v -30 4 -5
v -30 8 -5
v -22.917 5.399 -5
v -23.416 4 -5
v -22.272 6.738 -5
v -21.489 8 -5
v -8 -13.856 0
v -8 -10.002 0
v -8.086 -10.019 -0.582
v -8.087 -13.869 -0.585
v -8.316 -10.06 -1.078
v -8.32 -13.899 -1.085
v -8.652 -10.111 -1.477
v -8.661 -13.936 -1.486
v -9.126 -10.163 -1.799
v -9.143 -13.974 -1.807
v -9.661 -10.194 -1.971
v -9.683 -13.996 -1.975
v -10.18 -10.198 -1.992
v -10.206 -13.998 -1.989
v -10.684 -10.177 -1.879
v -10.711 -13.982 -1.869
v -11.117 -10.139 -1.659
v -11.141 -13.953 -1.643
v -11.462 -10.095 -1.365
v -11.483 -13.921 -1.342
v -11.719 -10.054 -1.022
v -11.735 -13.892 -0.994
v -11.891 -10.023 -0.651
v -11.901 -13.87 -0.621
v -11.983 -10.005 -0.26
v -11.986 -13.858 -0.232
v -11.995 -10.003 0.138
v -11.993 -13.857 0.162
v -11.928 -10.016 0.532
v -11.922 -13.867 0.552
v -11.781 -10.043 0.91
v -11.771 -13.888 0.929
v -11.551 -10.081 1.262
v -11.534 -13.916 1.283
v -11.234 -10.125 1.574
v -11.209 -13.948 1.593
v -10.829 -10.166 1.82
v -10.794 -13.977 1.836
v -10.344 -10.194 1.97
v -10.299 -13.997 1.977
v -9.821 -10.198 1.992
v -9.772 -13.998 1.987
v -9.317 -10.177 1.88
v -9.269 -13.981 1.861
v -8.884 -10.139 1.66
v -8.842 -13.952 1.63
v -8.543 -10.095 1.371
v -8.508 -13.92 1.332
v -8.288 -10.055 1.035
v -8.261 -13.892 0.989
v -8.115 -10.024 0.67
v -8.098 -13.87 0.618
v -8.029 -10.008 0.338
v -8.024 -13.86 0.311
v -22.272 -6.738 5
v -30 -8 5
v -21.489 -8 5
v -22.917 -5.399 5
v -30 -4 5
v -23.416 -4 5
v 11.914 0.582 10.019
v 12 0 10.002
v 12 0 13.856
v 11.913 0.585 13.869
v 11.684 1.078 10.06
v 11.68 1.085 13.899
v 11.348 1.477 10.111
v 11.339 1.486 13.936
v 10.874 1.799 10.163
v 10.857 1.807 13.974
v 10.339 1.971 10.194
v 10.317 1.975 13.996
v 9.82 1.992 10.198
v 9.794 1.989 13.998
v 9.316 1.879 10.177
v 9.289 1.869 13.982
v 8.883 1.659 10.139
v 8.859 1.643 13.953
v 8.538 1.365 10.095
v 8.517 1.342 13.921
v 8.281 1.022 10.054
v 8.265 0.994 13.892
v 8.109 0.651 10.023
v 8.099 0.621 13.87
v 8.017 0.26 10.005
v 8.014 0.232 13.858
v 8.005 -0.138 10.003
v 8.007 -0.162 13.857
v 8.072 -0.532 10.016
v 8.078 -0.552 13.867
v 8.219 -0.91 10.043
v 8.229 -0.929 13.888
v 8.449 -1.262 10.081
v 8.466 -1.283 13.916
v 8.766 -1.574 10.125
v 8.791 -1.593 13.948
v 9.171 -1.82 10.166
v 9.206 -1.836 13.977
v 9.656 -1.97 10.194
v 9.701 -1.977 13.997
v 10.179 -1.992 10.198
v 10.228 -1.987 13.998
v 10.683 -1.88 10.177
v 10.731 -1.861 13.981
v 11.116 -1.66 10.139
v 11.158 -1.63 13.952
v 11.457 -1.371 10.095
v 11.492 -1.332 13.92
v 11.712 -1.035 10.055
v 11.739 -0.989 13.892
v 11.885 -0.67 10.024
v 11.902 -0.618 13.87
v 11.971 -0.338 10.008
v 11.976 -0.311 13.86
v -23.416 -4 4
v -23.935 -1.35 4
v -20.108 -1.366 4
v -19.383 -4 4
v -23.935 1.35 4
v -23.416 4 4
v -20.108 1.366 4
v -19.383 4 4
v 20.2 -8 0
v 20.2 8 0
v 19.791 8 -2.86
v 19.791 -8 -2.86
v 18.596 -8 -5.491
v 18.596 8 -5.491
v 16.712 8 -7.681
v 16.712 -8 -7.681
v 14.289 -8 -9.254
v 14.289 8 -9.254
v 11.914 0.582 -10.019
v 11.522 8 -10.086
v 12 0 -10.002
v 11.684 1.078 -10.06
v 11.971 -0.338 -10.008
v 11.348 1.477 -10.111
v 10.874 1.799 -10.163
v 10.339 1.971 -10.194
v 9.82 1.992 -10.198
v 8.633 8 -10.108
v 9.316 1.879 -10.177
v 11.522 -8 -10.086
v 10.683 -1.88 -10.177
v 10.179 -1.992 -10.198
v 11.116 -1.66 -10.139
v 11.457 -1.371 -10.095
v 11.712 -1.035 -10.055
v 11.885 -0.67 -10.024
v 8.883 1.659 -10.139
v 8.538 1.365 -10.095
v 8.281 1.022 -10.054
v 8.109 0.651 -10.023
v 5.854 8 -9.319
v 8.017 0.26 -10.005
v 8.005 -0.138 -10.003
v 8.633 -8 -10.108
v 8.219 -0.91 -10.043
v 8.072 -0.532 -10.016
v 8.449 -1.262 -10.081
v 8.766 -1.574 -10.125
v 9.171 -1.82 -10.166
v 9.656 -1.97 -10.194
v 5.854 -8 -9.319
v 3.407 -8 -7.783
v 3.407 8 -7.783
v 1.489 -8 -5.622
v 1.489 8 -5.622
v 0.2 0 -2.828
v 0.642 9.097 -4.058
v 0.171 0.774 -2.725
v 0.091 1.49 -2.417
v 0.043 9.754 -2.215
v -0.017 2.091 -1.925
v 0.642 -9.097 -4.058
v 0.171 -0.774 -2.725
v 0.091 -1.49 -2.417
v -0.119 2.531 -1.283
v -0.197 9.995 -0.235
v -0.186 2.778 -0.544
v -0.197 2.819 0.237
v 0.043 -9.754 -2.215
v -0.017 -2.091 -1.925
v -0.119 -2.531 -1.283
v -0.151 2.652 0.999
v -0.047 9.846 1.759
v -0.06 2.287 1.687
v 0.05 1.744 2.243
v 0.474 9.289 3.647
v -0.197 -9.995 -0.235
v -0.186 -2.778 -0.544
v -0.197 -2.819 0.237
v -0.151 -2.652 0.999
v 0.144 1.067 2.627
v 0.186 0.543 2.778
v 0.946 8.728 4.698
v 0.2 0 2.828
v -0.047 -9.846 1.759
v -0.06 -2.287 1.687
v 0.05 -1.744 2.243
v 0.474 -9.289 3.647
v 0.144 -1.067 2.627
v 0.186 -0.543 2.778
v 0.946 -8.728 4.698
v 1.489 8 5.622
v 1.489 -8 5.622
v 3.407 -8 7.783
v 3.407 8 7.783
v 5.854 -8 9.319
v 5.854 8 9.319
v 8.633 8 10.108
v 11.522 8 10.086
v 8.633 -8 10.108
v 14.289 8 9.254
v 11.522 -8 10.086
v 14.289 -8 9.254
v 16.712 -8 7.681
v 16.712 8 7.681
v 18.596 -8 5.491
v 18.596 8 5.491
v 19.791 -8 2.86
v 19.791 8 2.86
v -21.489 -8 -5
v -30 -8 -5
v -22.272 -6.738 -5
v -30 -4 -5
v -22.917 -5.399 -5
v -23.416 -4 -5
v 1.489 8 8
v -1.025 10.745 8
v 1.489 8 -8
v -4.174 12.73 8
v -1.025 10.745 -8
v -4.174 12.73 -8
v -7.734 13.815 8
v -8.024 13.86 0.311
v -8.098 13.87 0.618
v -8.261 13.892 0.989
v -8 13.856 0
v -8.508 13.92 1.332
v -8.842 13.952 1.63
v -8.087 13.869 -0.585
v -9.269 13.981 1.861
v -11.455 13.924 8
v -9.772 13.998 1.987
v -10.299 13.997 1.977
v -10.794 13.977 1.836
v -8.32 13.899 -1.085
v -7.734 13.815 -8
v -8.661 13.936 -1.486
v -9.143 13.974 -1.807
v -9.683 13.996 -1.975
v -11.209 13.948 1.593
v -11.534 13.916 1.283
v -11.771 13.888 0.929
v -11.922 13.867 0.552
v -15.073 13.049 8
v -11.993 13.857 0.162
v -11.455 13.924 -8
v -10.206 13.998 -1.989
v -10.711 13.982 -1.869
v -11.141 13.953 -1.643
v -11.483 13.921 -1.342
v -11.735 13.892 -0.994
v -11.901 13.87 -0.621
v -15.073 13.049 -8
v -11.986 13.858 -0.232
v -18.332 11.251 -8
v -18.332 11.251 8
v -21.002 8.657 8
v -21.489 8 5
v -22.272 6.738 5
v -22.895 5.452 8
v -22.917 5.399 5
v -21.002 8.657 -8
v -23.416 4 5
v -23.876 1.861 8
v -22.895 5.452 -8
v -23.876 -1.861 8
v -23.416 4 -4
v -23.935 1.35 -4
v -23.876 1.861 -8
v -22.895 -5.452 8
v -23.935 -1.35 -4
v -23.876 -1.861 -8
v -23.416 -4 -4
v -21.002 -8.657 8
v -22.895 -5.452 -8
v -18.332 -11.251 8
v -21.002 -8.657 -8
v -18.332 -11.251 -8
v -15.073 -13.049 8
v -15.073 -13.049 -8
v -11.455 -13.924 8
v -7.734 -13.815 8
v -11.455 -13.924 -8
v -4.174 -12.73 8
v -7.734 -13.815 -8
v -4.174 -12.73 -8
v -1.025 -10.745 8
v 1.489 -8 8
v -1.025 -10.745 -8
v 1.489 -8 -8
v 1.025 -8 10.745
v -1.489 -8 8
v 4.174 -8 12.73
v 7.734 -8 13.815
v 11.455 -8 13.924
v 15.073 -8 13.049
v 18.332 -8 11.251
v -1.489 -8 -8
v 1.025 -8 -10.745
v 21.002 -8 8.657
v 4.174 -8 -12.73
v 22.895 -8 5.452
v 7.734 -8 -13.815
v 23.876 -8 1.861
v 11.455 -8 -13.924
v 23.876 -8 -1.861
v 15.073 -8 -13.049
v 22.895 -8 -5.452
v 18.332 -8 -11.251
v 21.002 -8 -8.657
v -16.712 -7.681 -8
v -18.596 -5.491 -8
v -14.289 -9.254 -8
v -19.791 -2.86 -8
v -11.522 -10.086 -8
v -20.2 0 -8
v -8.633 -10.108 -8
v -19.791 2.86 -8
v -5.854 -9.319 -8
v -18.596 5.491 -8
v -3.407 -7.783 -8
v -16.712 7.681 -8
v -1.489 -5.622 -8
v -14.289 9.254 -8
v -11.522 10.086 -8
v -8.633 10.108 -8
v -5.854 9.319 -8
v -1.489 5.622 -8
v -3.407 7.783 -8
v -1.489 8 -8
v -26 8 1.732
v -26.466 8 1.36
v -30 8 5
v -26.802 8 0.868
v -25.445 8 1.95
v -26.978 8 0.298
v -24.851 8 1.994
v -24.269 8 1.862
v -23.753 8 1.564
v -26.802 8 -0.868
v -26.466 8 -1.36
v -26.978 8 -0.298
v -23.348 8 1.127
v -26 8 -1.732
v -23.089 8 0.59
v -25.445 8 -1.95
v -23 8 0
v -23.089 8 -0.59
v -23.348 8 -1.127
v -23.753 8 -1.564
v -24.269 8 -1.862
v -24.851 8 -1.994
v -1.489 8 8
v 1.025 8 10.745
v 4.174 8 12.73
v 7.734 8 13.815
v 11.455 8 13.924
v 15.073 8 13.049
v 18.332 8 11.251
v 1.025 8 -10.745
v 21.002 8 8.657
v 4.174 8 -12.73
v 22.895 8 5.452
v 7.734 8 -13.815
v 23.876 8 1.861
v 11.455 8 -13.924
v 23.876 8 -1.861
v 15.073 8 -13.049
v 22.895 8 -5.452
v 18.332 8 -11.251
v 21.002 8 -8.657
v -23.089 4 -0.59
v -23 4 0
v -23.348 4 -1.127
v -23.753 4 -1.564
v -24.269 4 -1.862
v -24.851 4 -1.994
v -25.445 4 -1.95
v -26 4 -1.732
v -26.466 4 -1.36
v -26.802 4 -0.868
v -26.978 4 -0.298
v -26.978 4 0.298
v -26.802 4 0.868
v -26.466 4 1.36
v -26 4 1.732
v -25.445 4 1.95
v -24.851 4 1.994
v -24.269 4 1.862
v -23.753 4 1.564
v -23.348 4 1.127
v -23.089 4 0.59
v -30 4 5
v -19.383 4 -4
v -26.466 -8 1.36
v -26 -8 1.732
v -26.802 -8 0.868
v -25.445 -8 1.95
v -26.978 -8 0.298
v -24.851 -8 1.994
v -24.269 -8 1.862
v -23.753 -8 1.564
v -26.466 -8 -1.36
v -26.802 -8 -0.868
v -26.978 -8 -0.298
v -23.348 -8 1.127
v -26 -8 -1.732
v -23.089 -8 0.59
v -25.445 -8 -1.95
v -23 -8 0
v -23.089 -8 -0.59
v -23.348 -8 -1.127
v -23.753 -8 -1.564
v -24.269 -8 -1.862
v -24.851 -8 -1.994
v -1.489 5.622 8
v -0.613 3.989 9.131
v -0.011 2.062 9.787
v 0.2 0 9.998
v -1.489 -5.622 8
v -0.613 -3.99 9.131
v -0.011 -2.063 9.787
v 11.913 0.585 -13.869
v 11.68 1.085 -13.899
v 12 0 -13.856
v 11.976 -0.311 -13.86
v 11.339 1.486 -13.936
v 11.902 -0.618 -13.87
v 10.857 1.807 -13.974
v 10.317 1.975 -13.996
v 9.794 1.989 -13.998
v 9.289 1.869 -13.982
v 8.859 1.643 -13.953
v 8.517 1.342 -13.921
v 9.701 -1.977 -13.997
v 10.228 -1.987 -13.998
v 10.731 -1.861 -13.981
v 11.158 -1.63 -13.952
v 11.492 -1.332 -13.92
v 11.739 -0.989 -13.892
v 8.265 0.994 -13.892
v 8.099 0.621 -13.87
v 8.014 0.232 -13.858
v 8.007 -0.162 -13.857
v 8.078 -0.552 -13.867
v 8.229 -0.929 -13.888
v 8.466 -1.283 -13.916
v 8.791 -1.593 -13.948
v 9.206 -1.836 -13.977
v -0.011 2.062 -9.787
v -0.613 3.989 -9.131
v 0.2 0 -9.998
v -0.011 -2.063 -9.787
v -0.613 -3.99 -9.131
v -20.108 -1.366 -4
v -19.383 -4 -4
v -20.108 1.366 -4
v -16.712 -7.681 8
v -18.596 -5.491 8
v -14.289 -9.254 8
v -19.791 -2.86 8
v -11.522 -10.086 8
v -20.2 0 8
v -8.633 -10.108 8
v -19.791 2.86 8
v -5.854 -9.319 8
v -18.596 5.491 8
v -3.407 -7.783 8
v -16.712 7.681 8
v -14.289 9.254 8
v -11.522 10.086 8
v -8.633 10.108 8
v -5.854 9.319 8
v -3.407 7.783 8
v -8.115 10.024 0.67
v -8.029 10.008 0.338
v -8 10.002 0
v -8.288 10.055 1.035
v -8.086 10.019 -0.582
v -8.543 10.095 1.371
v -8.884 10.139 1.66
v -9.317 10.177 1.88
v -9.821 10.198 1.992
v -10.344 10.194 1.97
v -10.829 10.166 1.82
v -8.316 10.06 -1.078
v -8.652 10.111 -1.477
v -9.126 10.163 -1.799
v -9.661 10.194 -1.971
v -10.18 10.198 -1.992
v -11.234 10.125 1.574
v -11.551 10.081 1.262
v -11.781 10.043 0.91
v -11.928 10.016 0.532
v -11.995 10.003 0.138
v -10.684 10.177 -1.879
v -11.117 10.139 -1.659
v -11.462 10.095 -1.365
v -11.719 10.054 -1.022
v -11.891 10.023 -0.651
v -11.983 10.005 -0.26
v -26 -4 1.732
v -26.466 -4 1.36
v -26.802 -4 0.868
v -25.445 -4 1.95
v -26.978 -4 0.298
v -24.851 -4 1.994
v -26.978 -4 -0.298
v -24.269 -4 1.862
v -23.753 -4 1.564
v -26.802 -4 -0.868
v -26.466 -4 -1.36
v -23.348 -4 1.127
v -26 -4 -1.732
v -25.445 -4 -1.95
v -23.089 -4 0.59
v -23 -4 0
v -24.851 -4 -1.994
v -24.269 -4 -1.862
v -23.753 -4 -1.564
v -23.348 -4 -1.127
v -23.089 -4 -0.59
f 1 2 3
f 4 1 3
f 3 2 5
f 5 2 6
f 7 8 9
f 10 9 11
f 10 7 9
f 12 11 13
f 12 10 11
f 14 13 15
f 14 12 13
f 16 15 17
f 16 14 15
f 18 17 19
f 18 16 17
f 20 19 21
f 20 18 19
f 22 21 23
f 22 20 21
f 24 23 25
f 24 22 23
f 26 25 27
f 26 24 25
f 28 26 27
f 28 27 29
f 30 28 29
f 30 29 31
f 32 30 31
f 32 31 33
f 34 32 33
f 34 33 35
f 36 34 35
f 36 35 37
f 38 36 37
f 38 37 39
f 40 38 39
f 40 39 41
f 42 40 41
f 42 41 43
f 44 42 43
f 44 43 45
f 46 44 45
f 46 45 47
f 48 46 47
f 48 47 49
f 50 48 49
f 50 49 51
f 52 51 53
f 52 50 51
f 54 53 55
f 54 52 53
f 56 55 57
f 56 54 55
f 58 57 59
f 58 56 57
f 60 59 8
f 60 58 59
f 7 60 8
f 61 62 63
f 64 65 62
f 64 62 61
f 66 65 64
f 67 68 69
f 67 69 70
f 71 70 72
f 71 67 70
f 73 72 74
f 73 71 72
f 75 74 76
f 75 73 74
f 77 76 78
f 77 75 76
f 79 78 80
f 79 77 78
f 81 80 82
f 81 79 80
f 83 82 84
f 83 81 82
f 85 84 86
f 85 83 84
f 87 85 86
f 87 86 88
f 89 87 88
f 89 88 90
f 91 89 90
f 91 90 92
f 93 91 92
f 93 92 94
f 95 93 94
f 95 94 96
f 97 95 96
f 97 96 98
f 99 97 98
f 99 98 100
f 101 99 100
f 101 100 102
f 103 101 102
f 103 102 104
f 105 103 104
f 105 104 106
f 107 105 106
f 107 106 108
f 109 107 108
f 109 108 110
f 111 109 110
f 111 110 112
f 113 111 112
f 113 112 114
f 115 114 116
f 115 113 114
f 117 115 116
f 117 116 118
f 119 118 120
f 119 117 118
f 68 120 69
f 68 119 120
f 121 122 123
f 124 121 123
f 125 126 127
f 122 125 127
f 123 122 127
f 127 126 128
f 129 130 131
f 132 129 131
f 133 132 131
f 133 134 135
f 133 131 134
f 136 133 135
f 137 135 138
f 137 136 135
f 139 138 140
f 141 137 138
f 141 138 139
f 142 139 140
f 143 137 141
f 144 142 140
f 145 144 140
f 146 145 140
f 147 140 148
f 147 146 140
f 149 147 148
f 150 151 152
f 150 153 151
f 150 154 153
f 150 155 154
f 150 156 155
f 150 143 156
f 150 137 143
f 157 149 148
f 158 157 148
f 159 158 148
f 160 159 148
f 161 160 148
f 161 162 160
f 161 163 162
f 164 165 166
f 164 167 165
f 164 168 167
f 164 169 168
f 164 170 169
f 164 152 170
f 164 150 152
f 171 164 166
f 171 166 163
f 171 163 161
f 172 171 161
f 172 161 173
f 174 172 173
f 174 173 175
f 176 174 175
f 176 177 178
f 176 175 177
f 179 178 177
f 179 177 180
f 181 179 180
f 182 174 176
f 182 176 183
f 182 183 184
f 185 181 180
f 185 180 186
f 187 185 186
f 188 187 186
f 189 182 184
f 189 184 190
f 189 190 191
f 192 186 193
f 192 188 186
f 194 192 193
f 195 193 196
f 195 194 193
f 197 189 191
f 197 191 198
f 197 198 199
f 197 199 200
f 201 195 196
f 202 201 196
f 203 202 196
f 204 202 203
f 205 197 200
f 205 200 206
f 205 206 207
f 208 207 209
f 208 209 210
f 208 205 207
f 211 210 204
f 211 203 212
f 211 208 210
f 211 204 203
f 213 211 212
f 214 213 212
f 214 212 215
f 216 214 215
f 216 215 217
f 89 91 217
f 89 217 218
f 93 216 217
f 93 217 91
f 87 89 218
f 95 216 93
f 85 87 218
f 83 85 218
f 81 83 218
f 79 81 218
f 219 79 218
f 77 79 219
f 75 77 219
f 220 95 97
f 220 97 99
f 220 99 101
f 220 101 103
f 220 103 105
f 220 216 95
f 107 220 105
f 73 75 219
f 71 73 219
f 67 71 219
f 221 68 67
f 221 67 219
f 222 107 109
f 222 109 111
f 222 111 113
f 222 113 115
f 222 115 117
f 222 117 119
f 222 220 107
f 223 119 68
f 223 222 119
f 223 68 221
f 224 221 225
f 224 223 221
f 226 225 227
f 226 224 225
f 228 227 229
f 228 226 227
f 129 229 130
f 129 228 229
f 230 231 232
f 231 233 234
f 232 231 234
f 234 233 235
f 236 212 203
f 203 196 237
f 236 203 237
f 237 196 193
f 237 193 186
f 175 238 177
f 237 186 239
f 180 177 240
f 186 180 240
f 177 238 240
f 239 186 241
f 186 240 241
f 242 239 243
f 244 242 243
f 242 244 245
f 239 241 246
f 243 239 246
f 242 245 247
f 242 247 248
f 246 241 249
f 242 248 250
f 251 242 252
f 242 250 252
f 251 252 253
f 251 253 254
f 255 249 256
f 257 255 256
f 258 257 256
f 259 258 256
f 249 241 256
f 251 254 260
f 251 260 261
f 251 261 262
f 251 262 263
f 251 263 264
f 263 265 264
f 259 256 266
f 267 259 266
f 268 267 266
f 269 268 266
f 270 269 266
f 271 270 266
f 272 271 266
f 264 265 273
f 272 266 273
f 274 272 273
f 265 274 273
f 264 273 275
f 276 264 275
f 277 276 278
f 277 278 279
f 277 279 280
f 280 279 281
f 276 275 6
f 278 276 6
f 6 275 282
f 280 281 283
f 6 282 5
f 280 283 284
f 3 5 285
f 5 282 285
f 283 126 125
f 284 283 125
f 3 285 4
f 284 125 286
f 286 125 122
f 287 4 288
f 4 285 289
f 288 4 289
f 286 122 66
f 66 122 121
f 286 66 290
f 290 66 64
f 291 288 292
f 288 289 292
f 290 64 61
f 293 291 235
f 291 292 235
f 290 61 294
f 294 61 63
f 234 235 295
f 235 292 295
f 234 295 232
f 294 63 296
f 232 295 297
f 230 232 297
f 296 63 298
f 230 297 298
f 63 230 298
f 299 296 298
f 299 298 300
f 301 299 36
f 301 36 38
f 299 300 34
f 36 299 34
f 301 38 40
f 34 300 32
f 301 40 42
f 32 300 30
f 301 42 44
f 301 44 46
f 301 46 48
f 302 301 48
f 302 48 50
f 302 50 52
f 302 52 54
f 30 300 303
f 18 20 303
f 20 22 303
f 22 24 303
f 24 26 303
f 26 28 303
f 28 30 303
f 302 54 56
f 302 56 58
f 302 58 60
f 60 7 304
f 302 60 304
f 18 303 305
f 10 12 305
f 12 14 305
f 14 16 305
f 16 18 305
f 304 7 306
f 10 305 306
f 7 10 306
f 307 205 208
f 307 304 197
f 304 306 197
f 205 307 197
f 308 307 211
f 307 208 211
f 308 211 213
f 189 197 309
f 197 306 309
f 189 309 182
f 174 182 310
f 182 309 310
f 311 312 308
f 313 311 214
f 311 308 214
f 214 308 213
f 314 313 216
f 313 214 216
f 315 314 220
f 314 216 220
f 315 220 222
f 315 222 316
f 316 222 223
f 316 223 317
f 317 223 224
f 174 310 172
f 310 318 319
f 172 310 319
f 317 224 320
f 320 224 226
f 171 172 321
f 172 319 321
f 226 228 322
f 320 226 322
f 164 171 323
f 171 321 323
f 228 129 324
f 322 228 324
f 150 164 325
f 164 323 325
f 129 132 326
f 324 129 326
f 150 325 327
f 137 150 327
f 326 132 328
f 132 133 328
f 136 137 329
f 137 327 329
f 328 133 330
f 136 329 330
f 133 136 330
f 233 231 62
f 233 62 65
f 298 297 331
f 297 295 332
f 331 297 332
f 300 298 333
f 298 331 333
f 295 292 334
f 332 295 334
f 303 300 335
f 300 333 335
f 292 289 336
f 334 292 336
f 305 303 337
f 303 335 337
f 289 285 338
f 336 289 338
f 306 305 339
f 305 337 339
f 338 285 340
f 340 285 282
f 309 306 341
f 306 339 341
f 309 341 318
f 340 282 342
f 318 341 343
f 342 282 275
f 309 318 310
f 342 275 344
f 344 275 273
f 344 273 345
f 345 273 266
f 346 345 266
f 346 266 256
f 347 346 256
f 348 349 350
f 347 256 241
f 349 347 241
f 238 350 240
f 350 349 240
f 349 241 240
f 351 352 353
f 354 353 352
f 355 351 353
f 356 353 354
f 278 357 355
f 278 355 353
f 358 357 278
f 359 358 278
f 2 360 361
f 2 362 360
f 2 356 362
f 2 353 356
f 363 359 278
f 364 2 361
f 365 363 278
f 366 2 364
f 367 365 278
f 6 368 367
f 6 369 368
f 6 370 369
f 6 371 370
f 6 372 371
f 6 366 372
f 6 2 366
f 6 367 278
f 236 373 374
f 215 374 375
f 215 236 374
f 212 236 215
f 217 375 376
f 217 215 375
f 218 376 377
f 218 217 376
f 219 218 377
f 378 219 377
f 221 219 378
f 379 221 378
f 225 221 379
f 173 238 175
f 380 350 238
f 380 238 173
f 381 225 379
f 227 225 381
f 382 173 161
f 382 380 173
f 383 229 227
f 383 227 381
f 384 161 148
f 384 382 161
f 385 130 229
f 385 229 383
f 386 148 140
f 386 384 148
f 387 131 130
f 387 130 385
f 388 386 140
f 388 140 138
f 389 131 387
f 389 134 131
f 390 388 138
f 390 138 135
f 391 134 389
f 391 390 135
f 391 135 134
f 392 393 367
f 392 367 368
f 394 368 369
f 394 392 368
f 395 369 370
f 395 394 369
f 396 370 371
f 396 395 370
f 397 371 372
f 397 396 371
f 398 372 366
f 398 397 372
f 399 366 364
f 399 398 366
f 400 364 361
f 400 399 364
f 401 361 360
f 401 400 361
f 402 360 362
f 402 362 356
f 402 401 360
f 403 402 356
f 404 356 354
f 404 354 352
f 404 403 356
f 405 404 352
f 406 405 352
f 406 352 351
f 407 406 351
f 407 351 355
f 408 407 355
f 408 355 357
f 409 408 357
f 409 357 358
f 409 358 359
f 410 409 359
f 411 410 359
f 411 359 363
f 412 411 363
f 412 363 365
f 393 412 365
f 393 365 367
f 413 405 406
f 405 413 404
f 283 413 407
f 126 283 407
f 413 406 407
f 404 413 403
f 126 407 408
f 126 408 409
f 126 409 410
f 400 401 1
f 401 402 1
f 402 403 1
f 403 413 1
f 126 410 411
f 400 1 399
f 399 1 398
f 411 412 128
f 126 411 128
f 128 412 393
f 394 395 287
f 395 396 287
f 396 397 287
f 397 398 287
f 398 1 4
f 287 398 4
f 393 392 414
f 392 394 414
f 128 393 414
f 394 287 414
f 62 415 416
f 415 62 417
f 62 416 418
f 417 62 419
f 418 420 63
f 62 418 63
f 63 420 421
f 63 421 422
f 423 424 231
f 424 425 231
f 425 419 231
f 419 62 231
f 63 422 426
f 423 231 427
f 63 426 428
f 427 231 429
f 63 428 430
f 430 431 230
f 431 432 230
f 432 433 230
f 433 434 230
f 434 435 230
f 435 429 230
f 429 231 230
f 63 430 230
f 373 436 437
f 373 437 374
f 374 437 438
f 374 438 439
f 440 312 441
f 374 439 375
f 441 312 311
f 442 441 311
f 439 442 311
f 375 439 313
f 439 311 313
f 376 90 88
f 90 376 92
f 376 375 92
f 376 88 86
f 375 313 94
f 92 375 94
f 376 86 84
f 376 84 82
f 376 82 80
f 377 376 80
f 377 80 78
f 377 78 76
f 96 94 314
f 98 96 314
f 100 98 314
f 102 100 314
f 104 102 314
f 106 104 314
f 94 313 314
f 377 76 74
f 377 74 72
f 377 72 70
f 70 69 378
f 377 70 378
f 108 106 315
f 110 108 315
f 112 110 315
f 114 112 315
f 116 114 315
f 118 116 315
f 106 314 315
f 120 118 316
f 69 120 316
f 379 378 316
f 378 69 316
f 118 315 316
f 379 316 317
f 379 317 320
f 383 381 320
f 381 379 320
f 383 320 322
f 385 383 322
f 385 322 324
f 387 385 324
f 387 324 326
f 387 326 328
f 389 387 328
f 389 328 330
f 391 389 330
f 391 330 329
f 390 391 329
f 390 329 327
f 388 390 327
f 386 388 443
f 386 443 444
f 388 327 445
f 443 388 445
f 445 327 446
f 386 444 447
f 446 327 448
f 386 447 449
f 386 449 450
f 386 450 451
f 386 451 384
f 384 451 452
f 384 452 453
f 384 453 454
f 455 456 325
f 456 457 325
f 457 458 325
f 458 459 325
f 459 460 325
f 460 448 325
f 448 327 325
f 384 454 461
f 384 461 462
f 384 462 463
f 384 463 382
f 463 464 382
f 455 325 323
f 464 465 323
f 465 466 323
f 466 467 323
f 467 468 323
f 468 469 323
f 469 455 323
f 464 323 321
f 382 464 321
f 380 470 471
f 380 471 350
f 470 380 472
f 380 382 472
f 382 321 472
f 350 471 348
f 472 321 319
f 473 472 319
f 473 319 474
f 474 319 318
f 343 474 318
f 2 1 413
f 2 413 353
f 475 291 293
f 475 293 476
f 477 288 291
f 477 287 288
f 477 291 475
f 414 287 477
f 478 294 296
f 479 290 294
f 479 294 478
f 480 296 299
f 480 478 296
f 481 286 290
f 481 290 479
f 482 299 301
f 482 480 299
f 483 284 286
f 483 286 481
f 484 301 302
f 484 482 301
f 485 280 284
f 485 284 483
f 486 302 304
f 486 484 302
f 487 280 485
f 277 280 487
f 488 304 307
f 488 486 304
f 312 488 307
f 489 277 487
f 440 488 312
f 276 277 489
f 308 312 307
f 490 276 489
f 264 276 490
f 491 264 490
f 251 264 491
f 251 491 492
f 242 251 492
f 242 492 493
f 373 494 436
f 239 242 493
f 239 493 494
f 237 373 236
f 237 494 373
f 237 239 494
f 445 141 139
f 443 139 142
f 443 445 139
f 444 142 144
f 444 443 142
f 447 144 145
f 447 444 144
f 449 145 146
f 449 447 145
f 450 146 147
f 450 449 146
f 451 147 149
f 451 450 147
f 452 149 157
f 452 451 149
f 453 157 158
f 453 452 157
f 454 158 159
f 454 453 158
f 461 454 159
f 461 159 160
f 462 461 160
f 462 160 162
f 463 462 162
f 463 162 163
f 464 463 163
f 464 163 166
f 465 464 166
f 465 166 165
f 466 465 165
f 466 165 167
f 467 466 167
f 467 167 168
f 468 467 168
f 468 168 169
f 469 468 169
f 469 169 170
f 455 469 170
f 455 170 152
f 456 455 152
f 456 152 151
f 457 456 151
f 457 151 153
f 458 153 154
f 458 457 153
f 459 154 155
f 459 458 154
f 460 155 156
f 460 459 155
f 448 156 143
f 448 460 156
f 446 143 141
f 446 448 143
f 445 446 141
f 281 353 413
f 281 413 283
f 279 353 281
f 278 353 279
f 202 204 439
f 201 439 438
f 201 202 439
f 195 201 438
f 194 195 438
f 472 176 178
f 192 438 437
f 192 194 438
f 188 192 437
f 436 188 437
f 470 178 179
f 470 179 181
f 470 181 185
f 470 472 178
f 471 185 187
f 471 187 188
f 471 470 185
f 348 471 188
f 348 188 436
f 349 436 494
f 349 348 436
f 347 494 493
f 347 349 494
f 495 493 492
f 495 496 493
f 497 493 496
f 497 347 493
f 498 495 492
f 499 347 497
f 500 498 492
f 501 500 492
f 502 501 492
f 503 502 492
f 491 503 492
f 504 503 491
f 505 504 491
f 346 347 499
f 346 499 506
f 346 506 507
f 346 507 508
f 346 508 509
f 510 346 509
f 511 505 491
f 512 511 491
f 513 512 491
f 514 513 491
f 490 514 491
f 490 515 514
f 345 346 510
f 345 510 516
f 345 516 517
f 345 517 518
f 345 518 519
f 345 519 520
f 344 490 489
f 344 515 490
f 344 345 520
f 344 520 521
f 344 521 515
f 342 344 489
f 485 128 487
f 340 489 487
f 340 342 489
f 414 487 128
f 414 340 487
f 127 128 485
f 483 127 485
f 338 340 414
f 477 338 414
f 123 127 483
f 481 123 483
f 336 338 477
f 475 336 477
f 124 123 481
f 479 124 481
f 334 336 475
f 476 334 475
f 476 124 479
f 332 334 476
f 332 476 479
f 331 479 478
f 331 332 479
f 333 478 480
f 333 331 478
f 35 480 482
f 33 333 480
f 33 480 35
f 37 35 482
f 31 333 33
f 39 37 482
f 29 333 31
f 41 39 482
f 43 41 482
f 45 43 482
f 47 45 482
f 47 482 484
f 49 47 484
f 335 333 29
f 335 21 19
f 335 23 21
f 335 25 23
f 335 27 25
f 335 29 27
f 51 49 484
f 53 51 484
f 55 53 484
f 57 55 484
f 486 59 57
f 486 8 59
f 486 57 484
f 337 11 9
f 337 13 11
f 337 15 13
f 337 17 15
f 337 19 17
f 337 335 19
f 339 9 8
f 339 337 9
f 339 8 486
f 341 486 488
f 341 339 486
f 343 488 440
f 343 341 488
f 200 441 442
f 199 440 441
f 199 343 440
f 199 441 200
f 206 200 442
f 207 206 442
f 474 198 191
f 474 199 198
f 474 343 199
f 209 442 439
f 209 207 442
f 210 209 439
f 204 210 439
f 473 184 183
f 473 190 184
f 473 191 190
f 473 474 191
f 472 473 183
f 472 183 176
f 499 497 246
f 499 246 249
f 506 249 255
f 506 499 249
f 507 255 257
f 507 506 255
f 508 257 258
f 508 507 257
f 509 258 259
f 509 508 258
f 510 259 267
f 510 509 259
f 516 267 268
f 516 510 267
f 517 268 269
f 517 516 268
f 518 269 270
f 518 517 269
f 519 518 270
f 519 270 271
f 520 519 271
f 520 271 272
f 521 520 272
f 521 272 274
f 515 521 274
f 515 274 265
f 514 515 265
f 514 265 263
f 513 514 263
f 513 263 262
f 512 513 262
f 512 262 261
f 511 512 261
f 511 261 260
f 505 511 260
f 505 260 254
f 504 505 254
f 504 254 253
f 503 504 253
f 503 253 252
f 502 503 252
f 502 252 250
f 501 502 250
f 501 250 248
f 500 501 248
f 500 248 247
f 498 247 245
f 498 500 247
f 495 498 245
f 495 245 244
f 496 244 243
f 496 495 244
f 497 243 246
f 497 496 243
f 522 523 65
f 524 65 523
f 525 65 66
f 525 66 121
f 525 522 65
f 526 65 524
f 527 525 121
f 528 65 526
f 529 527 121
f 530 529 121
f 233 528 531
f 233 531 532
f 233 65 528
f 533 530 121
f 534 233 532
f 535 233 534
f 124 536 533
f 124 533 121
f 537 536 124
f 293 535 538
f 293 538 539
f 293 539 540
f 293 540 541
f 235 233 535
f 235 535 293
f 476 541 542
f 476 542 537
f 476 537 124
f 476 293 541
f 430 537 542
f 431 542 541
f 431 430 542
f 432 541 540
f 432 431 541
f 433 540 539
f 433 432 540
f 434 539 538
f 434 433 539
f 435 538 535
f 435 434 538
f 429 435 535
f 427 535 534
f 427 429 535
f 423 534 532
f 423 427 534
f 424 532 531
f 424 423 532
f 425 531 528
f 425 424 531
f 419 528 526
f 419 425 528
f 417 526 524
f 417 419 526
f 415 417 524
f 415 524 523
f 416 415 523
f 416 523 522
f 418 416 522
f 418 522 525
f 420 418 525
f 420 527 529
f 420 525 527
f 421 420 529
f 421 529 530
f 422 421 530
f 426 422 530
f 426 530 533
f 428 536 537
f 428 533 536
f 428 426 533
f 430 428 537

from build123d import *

# Parameters (mm, degrees)
CYLINDER004_R          = 2
CYLINDER004_DEPTH      = 16
CYLINDER004_ROLL_ANGLE = -90
BOX001_W               = 5
BOX001_H               = 8
BOX001_DEPTH           = 8
CYLINDER006_R          = 2
CYLINDER006_DEPTH      = 30
CYLINDER006_ROLL_ANGLE = -90
CYLINDER003_R          = 10.2
CYLINDER003_DEPTH      = 20
CYLINDER003_ROLL_ANGLE = -90
CYLINDER005_R          = 2
CYLINDER005_DEPTH      = 30
CYLINDER002_R          = 10.2
CYLINDER002_DEPTH      = 28
BOX_W                  = 10
BOX_H                  = 4
BOX_DEPTH              = 10
BOX002_W               = 10
BOX002_H               = 4
BOX002_DEPTH           = 10
CYLINDER001_R          = 14
CYLINDER001_DEPTH      = 16
CYLINDER001_ROLL_ANGLE = -90
CYLINDER_R             = 14
CYLINDER_DEPTH         = 16


with BuildPart() as cylinder004:
    # Cylinder004 → Cylinder004 (new body)
    with BuildSketch(Plane.XY):
        Circle(CYLINDER004_R)
    extrude(amount=CYLINDER004_DEPTH)


with BuildPart() as cylinder004_1:
    # Cylinder004 roll: moved
    add(cylinder004.part.rotate(Axis((0, 0, 0), (1, 0, 0)), CYLINDER004_ROLL_ANGLE))


with BuildPart() as cylinder004_2:
    # Cylinder004 placement: moved
    add(cylinder004_1.part.moved(Location((-25, -8, 0))))


with BuildPart() as cube001:
    # Box001 → Box001 (new body)
    with BuildSketch(Plane(origin=(-24, -4, -4), x_dir=(1, 0, 0), z_dir=(0, 0, 1))):
        with Locations((2.5, 4)):
            Rectangle(BOX001_W, BOX001_H)
    extrude(amount=BOX001_DEPTH)


with BuildPart() as cylinder006:
    # Cylinder006 → Cylinder006 (new body)
    with BuildSketch(Plane.XY):
        Circle(CYLINDER006_R)
    extrude(amount=CYLINDER006_DEPTH)


with BuildPart() as cylinder006_1:
    # Cylinder006 roll: moved
    add(cylinder006.part.rotate(Axis((0, 0, 0), (1, 0, 0)), CYLINDER006_ROLL_ANGLE))


with BuildPart() as cylinder006_2:
    # Cylinder006 placement: moved
    add(cylinder006_1.part.moved(Location((-10, -15, 0))))


with BuildPart() as cylinder003:
    # Cylinder003 → Cylinder003 (new body)
    with BuildSketch(Plane.XY):
        Circle(CYLINDER003_R)
    extrude(amount=CYLINDER003_DEPTH)


with BuildPart() as cylinder003_1:
    # Cylinder003 roll: moved
    add(cylinder003.part.rotate(Axis((0, 0, 0), (1, 0, 0)), CYLINDER003_ROLL_ANGLE))


with BuildPart() as cylinder003_2:
    # Cylinder003 placement: moved
    add(cylinder003_1.part.moved(Location((10, -10, 0))))


with BuildPart() as cylinder005:
    # Cylinder005 → Cylinder005 (new body)
    with BuildSketch(Plane(origin=(10, 0, -15), x_dir=(1, 0, 0), z_dir=(0, 0, 1))):
        Circle(CYLINDER005_R)
    extrude(amount=CYLINDER005_DEPTH)


with BuildPart() as negative_fusion:
    # Cylinder002 → Cylinder002 (new body)
    with BuildSketch(Plane(origin=(-10, 0, -10), x_dir=(1, 0, 0), z_dir=(0, 0, 1))):
        Circle(CYLINDER002_R)
    extrude(amount=CYLINDER002_DEPTH)

    # Fusion001: union Cylinder004, Cube001, Cylinder006, Cylinder003, Cylinder005
    add(cylinder004_2.part)
    add(cube001.part)
    add(cylinder006_2.part)
    add(cylinder003_2.part)
    add(cylinder005.part)


with BuildPart() as cube:
    # Box → Box (new body)
    with BuildSketch(Plane(origin=(-30, -8, -5), x_dir=(1, 0, 0), z_dir=(0, 0, 1))):
        with Locations((5, 2)):
            Rectangle(BOX_W, BOX_H)
    extrude(amount=BOX_DEPTH)


with BuildPart() as cube002:
    # Box002 → Box002 (new body)
    with BuildSketch(Plane(origin=(-30, 4, -5), x_dir=(1, 0, 0), z_dir=(0, 0, 1))):
        with Locations((5, 2)):
            Rectangle(BOX002_W, BOX002_H)
    extrude(amount=BOX002_DEPTH)


with BuildPart() as cylinder001:
    # Cylinder001 → Cylinder001 (new body)
    with BuildSketch(Plane.XY):
        Circle(CYLINDER001_R)
    extrude(amount=CYLINDER001_DEPTH)


with BuildPart() as cylinder001_1:
    # Cylinder001 roll: moved
    add(cylinder001.part.rotate(Axis((0, 0, 0), (1, 0, 0)), CYLINDER001_ROLL_ANGLE))


with BuildPart() as cylinder001_2:
    # Cylinder001 placement: moved
    add(cylinder001_1.part.moved(Location((10, -8, 0))))


with BuildPart() as cut:
    # Cylinder → Cylinder (new body)
    with BuildSketch(Plane(origin=(-10, 0, -8), x_dir=(1, 0, 0), z_dir=(0, 0, 1))):
        Circle(CYLINDER_R)
    extrude(amount=CYLINDER_DEPTH)

    # Fusion: union Cube, Cube002, Cylinder001
    add(cube.part)
    add(cube002.part)
    add(cylinder001_2.part)

    # Cut: cut Negative Fusion
    add(negative_fusion.part, mode=Mode.SUBTRACT)


solid = cut.part
